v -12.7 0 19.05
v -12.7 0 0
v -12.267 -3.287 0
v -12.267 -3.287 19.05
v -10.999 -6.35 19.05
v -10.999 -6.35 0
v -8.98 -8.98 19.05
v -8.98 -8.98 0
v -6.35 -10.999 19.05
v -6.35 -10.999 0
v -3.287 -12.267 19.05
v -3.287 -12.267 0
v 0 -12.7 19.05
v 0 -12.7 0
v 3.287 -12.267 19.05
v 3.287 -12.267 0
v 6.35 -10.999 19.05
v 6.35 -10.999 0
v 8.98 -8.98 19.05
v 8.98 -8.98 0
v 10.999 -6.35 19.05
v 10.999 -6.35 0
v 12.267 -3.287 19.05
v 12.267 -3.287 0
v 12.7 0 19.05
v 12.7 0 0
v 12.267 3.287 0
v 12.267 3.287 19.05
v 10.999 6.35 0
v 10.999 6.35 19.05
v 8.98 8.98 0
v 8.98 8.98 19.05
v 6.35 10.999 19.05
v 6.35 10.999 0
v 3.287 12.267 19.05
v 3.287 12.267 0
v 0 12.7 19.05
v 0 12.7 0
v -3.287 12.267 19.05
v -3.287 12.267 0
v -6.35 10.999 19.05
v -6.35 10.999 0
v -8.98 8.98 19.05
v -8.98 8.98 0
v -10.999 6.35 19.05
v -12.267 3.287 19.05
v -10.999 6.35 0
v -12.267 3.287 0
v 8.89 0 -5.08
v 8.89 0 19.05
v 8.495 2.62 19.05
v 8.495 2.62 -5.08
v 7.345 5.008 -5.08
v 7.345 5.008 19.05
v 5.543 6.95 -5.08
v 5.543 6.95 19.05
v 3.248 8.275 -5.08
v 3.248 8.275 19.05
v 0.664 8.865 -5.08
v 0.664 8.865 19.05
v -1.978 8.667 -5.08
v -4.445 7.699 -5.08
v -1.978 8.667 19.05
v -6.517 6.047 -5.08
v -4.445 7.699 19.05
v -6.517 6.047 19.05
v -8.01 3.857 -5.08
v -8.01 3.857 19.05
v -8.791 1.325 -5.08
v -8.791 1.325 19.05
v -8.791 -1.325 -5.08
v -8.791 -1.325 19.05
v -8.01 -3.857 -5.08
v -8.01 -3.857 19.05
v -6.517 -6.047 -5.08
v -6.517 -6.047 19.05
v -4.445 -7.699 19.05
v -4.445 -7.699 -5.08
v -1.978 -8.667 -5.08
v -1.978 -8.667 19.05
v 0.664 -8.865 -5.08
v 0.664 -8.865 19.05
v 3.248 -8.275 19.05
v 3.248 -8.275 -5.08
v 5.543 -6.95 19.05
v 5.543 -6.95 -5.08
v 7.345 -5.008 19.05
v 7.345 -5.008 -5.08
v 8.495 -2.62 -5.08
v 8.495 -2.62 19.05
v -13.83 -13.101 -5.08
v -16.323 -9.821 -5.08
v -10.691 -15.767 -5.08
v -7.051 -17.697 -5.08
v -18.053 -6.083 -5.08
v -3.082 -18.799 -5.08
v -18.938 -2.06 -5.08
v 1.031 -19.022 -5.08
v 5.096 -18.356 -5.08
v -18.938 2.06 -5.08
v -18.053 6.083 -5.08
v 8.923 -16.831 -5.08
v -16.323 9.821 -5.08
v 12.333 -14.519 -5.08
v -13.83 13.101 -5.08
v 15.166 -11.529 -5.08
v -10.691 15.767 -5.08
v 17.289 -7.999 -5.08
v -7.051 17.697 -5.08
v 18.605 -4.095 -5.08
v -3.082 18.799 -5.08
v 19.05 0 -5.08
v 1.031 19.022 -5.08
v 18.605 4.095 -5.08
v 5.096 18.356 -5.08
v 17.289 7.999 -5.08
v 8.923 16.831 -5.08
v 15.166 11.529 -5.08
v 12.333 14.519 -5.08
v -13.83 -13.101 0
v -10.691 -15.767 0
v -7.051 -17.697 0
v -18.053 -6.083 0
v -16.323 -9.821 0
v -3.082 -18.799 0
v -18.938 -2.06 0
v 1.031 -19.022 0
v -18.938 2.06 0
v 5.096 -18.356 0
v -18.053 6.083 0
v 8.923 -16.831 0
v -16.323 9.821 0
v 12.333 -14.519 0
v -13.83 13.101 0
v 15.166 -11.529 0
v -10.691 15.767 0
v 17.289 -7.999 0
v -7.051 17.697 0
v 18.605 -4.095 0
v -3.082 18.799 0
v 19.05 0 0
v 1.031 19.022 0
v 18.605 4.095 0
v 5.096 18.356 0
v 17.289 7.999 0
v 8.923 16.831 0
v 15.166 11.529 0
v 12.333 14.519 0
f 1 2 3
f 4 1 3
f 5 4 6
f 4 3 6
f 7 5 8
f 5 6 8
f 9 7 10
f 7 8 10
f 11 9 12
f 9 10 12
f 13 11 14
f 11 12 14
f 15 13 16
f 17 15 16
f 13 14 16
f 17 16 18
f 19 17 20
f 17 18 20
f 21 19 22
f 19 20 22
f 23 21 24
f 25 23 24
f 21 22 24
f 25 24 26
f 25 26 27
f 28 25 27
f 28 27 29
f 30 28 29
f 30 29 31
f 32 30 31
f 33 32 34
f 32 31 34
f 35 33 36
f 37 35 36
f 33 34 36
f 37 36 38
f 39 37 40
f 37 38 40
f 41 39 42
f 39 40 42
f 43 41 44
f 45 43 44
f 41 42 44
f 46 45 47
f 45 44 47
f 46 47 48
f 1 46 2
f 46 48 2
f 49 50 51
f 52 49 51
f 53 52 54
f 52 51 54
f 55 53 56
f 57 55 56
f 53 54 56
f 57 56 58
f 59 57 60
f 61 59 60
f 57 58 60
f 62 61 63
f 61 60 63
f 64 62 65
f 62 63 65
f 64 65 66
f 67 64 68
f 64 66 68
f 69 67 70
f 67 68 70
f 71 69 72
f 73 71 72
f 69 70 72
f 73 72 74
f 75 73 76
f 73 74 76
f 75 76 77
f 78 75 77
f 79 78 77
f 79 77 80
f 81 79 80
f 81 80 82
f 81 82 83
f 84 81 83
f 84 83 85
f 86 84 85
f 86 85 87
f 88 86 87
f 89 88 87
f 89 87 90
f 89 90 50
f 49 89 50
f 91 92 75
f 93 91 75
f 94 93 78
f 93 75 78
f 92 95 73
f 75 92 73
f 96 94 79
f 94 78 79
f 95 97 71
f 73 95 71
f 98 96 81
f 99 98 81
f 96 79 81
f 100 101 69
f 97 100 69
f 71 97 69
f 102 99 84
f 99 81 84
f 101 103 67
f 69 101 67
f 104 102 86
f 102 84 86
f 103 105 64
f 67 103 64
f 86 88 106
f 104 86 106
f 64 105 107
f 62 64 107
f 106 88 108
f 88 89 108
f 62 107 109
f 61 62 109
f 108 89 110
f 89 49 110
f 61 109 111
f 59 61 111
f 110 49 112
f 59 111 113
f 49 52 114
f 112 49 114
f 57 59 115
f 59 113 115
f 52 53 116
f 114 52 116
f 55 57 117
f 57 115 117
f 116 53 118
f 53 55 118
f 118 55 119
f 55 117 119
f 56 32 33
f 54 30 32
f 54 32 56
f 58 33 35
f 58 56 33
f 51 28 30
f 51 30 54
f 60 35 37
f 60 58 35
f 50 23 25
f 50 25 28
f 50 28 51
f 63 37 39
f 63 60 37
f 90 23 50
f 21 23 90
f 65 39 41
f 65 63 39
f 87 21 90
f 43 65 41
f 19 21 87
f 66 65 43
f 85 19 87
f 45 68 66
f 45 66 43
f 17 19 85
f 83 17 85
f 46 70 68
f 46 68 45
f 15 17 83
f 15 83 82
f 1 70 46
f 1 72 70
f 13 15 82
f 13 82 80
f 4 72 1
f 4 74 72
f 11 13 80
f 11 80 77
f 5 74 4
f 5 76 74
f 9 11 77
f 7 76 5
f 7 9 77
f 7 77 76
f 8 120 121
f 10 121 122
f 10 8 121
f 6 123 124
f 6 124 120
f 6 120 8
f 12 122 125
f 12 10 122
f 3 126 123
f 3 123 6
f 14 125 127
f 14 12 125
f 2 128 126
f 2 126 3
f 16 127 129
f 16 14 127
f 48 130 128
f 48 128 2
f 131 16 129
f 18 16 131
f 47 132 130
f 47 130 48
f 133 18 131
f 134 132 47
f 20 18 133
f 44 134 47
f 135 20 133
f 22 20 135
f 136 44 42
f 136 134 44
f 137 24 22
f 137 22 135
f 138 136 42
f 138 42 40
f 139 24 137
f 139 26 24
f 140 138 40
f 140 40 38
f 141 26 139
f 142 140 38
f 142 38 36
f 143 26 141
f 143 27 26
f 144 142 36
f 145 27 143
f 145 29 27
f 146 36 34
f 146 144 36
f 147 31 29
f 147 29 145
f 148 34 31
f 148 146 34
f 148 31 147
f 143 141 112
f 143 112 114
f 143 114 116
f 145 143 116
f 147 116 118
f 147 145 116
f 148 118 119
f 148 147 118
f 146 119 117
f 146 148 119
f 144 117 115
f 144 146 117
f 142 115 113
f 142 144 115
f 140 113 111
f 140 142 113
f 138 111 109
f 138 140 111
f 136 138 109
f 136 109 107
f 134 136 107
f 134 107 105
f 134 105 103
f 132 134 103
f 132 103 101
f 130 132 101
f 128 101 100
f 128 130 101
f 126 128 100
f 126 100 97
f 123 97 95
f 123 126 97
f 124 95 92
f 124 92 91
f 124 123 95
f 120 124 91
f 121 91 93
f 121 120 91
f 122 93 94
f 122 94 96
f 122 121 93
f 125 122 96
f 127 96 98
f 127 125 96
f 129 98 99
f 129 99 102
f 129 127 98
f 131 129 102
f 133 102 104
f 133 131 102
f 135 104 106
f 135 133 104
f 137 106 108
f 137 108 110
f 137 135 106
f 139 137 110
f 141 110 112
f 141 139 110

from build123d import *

# Parameters (mm, degrees)
SKETCH1_R           = 19.05
BOSS_EXTRUDE1_DEPTH = 5.08
SKETCH2_R           = 12.7
BOSS_EXTRUDE2_DEPTH = 19.05
CUT_EXTRUDE1_REACH  = 38.167
SKETCH3_R           = 8.89


with BuildPart() as part:
    # Sketch1 → Boss-Extrude1 (new body)
    with BuildSketch(Plane.XY):
        Circle(SKETCH1_R)
    extrude(amount=-BOSS_EXTRUDE1_DEPTH)

    # Sketch2 → Boss-Extrude2 (add)
    with BuildSketch(Plane.XY):
        with Locations(Location((0, 0, 0), (0, 0, 180))):
            Circle(SKETCH2_R)
    extrude(amount=BOSS_EXTRUDE2_DEPTH)

    # Sketch3 → Cut-Extrude1 (cut, up to next)
    with BuildSketch(Plane.XY.offset(19.05), mode=Mode.PRIVATE) as cut_extrude1_sk1:
        Circle(SKETCH3_R)
    cut_extrude1_tool1 = extrude(cut_extrude1_sk1.sketch, amount=-CUT_EXTRUDE1_REACH, mode=Mode.PRIVATE) & part.part
    add(cut_extrude1_tool1.solids().sort_by_distance((0, 0, 19.05))[0], mode=Mode.SUBTRACT)


solid = part.part
